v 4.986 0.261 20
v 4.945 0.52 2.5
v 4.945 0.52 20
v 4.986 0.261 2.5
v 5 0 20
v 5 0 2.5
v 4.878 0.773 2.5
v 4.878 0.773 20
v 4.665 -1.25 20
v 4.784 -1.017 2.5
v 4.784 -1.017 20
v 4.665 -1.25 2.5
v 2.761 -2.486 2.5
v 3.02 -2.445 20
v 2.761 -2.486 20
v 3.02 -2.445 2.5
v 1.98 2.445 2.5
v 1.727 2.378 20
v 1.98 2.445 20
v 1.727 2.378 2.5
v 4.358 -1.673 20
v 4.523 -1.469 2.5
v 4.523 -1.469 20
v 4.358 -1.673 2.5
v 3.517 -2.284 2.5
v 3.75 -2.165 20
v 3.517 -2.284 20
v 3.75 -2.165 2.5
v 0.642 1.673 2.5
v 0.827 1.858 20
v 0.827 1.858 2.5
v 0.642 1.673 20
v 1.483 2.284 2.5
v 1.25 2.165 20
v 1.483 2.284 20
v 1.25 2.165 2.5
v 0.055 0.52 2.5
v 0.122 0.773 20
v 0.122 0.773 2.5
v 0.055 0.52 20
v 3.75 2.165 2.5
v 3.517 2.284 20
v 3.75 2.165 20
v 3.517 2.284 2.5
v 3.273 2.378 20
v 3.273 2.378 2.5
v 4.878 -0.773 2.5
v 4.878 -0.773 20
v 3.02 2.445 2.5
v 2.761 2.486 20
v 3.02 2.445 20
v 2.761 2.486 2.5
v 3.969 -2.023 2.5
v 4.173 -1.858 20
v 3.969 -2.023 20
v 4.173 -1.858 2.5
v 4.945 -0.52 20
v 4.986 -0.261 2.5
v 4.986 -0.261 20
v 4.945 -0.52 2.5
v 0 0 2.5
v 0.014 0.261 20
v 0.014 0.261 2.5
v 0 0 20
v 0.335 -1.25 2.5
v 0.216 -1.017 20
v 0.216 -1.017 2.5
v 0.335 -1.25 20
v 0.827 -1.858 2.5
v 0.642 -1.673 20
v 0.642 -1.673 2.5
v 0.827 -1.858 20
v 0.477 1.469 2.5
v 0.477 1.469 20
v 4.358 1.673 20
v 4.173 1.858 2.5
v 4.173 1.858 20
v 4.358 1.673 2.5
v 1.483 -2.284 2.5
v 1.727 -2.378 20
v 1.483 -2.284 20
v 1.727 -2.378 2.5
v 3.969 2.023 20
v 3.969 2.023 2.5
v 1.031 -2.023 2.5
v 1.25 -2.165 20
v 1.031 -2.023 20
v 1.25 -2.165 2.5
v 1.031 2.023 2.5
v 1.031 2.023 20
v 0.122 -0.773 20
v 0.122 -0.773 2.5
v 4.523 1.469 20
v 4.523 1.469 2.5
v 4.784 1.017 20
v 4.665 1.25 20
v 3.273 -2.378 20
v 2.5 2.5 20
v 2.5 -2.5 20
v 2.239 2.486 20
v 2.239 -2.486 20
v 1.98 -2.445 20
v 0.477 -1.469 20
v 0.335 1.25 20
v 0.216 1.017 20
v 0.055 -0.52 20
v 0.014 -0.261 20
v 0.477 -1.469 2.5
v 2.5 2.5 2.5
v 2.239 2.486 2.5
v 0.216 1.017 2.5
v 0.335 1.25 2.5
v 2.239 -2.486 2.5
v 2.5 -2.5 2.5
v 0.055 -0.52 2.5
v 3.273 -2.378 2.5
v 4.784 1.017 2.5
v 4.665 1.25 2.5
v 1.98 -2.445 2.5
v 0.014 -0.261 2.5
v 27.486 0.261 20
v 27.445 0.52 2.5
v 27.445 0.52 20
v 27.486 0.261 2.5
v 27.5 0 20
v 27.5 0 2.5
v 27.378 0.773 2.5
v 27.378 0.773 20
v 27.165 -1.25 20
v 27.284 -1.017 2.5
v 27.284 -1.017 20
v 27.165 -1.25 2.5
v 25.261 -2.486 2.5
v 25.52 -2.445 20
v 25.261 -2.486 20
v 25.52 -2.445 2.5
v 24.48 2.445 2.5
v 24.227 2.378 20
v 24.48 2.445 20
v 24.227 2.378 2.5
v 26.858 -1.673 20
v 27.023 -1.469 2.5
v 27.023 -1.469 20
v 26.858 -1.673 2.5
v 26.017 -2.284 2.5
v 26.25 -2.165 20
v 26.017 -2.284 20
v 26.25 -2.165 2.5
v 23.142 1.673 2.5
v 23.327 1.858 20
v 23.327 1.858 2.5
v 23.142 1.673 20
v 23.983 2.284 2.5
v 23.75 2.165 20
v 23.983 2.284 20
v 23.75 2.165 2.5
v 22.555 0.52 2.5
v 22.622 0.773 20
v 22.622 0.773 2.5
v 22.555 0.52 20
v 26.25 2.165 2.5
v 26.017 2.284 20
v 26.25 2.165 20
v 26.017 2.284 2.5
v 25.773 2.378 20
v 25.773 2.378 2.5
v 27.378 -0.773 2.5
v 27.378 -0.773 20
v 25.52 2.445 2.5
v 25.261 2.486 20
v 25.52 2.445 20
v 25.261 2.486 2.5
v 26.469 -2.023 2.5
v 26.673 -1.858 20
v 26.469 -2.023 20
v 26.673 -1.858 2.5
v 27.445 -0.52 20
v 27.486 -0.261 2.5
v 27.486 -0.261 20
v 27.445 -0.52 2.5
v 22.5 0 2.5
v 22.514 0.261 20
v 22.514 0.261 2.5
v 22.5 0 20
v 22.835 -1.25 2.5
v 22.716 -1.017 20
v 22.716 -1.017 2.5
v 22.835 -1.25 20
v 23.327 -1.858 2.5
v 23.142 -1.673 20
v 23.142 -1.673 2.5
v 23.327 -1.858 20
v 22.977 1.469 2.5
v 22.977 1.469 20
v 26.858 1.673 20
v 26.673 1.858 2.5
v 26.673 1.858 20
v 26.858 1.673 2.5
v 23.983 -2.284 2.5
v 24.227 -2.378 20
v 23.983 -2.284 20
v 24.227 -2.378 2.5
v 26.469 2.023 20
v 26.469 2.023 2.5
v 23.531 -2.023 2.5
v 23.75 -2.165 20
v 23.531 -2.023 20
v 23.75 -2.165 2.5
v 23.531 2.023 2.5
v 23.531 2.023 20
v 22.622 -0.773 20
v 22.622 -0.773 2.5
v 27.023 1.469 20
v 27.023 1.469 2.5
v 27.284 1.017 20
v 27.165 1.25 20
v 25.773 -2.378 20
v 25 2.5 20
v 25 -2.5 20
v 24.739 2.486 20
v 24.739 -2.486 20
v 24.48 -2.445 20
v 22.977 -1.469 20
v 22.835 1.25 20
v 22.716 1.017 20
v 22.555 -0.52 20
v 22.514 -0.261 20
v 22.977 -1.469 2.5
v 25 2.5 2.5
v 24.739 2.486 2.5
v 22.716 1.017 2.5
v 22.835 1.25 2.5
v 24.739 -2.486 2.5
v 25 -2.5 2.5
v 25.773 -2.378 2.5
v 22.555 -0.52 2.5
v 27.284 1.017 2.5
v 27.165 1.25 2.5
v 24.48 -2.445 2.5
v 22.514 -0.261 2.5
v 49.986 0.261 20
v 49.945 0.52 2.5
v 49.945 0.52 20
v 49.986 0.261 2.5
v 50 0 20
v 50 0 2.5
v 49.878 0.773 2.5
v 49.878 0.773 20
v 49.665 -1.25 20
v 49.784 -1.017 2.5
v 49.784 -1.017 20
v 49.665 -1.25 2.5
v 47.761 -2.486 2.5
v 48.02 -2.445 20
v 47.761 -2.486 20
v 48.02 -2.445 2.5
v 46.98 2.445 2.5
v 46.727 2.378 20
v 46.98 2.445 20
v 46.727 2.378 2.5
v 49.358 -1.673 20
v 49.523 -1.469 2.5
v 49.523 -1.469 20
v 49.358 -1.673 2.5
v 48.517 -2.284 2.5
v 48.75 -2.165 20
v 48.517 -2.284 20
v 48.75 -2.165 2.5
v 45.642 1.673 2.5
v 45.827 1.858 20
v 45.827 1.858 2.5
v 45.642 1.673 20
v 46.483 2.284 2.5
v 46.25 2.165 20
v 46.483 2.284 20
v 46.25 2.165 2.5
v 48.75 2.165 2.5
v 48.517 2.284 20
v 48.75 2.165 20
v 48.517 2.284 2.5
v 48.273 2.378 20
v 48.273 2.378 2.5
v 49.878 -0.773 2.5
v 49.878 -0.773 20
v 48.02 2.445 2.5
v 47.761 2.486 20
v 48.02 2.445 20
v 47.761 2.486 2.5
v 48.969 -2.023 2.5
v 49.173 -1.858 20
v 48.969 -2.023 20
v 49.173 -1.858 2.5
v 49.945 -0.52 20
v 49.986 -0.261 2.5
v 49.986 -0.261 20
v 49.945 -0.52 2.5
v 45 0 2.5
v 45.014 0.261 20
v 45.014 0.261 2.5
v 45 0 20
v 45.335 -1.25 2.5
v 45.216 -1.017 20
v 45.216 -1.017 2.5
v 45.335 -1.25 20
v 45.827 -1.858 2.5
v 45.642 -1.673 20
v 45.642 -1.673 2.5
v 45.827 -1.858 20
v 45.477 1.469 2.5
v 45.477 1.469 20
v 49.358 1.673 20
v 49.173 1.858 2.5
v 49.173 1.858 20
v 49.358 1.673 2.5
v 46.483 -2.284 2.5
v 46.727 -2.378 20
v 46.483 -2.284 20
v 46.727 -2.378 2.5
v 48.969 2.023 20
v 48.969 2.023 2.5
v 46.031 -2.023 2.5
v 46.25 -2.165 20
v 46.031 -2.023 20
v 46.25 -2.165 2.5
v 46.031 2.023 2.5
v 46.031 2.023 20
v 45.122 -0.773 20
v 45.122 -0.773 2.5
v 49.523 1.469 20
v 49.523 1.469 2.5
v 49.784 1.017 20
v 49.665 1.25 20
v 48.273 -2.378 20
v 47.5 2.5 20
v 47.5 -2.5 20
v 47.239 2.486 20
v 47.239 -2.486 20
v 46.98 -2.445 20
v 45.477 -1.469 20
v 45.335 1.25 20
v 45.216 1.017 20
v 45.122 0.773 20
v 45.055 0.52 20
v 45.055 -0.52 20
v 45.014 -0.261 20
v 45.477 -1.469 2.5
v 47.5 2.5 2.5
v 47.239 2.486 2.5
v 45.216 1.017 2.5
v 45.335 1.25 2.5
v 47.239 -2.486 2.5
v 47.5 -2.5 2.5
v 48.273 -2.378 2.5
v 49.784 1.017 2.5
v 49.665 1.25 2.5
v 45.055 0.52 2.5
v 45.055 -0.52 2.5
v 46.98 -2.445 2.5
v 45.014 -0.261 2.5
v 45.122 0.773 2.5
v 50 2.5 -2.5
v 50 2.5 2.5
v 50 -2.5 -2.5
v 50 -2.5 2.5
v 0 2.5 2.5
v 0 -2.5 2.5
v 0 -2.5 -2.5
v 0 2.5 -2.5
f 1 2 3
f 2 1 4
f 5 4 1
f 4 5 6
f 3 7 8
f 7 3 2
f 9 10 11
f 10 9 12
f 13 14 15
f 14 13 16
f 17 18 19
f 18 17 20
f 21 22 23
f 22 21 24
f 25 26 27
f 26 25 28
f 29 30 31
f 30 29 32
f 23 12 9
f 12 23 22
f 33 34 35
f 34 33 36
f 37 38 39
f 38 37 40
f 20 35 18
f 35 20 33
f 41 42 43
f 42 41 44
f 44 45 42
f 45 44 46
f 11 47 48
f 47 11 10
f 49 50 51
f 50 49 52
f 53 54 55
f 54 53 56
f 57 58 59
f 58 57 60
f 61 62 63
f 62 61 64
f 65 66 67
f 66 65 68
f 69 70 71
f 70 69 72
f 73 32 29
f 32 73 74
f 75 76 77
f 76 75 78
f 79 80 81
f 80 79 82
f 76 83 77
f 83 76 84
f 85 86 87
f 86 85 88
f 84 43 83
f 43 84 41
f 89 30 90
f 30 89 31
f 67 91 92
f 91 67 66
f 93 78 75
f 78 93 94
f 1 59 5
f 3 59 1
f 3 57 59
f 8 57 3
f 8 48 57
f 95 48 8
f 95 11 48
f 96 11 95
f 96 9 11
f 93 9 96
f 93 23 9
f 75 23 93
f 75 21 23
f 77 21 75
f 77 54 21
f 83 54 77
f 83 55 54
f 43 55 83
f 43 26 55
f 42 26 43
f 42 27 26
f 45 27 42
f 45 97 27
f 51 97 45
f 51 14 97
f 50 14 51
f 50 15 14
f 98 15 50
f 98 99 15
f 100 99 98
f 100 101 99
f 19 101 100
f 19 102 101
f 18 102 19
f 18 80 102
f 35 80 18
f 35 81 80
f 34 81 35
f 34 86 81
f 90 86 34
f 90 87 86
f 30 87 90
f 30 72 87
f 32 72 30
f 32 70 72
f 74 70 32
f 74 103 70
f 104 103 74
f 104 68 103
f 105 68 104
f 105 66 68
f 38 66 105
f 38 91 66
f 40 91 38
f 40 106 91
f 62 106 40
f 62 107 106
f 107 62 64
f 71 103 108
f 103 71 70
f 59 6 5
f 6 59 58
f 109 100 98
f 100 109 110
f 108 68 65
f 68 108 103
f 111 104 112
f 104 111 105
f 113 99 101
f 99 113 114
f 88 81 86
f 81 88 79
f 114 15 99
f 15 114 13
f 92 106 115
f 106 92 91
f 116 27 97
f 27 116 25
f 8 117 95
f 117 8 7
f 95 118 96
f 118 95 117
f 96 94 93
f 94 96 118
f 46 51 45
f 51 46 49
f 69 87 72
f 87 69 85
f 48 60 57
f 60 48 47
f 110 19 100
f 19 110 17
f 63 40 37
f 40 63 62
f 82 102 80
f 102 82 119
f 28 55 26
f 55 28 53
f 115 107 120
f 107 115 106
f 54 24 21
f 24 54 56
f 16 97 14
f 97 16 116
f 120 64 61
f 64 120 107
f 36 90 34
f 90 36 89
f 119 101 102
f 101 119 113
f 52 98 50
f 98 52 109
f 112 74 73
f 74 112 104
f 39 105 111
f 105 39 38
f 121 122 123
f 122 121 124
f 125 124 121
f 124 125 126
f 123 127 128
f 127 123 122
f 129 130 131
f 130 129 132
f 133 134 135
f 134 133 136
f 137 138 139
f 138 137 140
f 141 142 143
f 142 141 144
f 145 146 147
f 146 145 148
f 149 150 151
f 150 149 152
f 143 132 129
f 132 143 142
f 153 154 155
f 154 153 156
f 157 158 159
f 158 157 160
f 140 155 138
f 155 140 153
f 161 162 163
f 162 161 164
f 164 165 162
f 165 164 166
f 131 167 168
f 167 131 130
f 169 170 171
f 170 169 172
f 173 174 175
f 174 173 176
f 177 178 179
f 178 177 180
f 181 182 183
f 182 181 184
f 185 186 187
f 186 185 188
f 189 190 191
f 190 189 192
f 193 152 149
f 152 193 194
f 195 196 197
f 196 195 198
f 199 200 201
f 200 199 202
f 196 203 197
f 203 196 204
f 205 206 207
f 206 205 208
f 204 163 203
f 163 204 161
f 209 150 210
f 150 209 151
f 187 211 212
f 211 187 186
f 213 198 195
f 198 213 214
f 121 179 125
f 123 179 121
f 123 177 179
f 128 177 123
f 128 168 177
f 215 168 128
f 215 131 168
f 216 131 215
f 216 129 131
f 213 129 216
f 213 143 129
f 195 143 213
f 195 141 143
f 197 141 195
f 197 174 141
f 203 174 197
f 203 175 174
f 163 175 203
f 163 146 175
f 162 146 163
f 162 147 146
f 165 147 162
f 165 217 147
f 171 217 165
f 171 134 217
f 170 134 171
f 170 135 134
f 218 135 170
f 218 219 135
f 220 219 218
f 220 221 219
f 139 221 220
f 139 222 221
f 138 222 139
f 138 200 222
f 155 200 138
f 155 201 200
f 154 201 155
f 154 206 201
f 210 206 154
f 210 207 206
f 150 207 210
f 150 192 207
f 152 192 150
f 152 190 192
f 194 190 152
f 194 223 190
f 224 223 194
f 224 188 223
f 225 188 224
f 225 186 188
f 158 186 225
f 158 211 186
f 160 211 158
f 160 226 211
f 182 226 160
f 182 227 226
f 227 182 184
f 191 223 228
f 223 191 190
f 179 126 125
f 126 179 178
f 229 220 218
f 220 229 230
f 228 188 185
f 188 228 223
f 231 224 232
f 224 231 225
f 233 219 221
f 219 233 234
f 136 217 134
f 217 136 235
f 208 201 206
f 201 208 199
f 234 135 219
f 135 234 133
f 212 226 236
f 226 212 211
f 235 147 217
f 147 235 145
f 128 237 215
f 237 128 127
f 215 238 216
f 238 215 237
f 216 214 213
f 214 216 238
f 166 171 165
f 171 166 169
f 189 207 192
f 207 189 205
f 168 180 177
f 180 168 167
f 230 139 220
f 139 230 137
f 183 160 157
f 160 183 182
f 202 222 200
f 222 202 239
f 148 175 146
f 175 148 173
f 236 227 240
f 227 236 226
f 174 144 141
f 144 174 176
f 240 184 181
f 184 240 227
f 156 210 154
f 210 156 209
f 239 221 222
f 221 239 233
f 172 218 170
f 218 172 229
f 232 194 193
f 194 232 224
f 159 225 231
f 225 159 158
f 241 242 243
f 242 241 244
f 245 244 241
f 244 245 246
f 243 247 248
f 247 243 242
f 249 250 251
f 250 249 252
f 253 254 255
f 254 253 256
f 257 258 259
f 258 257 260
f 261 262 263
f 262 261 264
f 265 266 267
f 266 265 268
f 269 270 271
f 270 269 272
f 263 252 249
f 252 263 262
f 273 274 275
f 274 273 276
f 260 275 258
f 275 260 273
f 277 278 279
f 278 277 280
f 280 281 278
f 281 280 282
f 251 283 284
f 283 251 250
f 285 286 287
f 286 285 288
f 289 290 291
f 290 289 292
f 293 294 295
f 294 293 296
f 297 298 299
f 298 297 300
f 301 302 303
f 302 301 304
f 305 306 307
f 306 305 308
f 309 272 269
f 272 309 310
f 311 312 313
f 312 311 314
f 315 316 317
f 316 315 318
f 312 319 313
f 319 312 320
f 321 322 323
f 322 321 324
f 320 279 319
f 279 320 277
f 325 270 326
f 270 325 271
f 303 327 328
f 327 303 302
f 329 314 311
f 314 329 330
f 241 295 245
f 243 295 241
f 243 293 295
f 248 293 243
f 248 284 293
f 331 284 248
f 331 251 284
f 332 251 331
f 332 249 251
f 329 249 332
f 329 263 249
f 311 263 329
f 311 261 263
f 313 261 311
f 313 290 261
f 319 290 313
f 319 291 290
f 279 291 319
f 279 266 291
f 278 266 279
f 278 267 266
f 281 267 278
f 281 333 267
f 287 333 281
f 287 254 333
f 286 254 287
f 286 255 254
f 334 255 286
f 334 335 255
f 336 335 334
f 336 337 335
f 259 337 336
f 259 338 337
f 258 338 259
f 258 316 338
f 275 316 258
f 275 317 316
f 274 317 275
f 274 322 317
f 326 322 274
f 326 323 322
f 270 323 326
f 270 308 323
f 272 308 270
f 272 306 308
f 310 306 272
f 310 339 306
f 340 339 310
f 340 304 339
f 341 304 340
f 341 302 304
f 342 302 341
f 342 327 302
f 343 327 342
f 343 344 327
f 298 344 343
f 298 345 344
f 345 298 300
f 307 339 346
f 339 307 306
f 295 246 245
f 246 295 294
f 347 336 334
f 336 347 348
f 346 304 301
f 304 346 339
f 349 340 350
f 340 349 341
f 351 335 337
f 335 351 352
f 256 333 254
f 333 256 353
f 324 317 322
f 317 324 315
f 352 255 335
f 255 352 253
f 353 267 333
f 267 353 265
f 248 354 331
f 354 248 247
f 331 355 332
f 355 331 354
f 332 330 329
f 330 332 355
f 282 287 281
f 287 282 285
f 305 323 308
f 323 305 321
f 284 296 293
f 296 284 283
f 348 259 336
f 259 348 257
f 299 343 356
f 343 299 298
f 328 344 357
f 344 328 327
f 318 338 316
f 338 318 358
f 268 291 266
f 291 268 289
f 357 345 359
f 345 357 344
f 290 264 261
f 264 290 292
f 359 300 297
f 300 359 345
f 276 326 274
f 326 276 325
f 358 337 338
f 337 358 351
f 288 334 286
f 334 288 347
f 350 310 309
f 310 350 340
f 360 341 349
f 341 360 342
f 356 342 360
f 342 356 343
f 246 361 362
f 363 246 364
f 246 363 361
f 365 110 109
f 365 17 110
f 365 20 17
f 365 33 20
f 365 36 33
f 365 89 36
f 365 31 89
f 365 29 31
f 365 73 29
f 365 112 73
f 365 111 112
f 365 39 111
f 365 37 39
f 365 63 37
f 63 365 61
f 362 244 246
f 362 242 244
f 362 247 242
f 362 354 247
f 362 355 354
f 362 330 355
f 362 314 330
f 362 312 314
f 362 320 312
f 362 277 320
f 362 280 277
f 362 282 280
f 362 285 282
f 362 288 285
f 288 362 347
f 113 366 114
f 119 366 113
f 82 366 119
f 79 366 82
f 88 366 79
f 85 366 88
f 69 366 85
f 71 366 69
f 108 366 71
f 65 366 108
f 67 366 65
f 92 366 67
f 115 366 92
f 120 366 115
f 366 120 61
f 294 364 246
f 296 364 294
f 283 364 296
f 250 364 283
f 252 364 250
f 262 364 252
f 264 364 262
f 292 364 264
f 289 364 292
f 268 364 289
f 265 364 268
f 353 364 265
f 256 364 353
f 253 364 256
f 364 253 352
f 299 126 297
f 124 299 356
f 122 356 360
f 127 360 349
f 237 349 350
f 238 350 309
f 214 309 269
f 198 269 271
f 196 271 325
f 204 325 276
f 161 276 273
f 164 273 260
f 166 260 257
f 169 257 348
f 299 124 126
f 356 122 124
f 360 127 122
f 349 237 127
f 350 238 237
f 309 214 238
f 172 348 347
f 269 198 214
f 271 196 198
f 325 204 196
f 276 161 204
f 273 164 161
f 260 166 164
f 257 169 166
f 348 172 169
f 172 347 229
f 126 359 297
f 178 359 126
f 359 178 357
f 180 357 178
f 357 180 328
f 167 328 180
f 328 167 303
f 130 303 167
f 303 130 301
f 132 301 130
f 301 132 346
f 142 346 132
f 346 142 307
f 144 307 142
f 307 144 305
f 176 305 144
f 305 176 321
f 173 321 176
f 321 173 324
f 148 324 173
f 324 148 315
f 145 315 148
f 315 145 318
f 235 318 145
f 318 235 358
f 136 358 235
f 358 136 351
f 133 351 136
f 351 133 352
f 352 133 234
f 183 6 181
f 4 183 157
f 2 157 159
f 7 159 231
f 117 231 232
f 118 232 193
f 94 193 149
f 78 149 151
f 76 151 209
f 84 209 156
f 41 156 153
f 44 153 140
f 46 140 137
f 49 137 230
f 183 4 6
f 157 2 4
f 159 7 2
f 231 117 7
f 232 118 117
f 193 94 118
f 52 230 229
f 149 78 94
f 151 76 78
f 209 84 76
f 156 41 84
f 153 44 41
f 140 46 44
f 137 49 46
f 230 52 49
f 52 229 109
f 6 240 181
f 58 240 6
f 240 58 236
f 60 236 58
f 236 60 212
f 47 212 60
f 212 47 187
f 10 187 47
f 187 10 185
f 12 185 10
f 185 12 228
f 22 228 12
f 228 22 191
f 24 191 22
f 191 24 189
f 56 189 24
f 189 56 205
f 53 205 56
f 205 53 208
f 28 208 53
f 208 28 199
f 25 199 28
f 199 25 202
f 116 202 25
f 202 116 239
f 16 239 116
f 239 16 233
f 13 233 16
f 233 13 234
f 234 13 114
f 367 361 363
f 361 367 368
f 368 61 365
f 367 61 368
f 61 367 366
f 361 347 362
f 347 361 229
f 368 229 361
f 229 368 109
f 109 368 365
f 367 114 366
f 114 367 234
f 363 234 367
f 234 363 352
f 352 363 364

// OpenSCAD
height = 25;
width = 50;
thickness = 5;

$fn=60;

translate([thickness/2,0,0]) cylinder(r=thickness/2, h=height-thickness);
translate([width/2,0,0]) cylinder(r=thickness/2, h=height-thickness);
translate([width-thickness/2,0,0]) cylinder(r=thickness/2, h=height-thickness);

translate([0,-thickness/2,-thickness/2]) cube([width,thickness,thickness]);
